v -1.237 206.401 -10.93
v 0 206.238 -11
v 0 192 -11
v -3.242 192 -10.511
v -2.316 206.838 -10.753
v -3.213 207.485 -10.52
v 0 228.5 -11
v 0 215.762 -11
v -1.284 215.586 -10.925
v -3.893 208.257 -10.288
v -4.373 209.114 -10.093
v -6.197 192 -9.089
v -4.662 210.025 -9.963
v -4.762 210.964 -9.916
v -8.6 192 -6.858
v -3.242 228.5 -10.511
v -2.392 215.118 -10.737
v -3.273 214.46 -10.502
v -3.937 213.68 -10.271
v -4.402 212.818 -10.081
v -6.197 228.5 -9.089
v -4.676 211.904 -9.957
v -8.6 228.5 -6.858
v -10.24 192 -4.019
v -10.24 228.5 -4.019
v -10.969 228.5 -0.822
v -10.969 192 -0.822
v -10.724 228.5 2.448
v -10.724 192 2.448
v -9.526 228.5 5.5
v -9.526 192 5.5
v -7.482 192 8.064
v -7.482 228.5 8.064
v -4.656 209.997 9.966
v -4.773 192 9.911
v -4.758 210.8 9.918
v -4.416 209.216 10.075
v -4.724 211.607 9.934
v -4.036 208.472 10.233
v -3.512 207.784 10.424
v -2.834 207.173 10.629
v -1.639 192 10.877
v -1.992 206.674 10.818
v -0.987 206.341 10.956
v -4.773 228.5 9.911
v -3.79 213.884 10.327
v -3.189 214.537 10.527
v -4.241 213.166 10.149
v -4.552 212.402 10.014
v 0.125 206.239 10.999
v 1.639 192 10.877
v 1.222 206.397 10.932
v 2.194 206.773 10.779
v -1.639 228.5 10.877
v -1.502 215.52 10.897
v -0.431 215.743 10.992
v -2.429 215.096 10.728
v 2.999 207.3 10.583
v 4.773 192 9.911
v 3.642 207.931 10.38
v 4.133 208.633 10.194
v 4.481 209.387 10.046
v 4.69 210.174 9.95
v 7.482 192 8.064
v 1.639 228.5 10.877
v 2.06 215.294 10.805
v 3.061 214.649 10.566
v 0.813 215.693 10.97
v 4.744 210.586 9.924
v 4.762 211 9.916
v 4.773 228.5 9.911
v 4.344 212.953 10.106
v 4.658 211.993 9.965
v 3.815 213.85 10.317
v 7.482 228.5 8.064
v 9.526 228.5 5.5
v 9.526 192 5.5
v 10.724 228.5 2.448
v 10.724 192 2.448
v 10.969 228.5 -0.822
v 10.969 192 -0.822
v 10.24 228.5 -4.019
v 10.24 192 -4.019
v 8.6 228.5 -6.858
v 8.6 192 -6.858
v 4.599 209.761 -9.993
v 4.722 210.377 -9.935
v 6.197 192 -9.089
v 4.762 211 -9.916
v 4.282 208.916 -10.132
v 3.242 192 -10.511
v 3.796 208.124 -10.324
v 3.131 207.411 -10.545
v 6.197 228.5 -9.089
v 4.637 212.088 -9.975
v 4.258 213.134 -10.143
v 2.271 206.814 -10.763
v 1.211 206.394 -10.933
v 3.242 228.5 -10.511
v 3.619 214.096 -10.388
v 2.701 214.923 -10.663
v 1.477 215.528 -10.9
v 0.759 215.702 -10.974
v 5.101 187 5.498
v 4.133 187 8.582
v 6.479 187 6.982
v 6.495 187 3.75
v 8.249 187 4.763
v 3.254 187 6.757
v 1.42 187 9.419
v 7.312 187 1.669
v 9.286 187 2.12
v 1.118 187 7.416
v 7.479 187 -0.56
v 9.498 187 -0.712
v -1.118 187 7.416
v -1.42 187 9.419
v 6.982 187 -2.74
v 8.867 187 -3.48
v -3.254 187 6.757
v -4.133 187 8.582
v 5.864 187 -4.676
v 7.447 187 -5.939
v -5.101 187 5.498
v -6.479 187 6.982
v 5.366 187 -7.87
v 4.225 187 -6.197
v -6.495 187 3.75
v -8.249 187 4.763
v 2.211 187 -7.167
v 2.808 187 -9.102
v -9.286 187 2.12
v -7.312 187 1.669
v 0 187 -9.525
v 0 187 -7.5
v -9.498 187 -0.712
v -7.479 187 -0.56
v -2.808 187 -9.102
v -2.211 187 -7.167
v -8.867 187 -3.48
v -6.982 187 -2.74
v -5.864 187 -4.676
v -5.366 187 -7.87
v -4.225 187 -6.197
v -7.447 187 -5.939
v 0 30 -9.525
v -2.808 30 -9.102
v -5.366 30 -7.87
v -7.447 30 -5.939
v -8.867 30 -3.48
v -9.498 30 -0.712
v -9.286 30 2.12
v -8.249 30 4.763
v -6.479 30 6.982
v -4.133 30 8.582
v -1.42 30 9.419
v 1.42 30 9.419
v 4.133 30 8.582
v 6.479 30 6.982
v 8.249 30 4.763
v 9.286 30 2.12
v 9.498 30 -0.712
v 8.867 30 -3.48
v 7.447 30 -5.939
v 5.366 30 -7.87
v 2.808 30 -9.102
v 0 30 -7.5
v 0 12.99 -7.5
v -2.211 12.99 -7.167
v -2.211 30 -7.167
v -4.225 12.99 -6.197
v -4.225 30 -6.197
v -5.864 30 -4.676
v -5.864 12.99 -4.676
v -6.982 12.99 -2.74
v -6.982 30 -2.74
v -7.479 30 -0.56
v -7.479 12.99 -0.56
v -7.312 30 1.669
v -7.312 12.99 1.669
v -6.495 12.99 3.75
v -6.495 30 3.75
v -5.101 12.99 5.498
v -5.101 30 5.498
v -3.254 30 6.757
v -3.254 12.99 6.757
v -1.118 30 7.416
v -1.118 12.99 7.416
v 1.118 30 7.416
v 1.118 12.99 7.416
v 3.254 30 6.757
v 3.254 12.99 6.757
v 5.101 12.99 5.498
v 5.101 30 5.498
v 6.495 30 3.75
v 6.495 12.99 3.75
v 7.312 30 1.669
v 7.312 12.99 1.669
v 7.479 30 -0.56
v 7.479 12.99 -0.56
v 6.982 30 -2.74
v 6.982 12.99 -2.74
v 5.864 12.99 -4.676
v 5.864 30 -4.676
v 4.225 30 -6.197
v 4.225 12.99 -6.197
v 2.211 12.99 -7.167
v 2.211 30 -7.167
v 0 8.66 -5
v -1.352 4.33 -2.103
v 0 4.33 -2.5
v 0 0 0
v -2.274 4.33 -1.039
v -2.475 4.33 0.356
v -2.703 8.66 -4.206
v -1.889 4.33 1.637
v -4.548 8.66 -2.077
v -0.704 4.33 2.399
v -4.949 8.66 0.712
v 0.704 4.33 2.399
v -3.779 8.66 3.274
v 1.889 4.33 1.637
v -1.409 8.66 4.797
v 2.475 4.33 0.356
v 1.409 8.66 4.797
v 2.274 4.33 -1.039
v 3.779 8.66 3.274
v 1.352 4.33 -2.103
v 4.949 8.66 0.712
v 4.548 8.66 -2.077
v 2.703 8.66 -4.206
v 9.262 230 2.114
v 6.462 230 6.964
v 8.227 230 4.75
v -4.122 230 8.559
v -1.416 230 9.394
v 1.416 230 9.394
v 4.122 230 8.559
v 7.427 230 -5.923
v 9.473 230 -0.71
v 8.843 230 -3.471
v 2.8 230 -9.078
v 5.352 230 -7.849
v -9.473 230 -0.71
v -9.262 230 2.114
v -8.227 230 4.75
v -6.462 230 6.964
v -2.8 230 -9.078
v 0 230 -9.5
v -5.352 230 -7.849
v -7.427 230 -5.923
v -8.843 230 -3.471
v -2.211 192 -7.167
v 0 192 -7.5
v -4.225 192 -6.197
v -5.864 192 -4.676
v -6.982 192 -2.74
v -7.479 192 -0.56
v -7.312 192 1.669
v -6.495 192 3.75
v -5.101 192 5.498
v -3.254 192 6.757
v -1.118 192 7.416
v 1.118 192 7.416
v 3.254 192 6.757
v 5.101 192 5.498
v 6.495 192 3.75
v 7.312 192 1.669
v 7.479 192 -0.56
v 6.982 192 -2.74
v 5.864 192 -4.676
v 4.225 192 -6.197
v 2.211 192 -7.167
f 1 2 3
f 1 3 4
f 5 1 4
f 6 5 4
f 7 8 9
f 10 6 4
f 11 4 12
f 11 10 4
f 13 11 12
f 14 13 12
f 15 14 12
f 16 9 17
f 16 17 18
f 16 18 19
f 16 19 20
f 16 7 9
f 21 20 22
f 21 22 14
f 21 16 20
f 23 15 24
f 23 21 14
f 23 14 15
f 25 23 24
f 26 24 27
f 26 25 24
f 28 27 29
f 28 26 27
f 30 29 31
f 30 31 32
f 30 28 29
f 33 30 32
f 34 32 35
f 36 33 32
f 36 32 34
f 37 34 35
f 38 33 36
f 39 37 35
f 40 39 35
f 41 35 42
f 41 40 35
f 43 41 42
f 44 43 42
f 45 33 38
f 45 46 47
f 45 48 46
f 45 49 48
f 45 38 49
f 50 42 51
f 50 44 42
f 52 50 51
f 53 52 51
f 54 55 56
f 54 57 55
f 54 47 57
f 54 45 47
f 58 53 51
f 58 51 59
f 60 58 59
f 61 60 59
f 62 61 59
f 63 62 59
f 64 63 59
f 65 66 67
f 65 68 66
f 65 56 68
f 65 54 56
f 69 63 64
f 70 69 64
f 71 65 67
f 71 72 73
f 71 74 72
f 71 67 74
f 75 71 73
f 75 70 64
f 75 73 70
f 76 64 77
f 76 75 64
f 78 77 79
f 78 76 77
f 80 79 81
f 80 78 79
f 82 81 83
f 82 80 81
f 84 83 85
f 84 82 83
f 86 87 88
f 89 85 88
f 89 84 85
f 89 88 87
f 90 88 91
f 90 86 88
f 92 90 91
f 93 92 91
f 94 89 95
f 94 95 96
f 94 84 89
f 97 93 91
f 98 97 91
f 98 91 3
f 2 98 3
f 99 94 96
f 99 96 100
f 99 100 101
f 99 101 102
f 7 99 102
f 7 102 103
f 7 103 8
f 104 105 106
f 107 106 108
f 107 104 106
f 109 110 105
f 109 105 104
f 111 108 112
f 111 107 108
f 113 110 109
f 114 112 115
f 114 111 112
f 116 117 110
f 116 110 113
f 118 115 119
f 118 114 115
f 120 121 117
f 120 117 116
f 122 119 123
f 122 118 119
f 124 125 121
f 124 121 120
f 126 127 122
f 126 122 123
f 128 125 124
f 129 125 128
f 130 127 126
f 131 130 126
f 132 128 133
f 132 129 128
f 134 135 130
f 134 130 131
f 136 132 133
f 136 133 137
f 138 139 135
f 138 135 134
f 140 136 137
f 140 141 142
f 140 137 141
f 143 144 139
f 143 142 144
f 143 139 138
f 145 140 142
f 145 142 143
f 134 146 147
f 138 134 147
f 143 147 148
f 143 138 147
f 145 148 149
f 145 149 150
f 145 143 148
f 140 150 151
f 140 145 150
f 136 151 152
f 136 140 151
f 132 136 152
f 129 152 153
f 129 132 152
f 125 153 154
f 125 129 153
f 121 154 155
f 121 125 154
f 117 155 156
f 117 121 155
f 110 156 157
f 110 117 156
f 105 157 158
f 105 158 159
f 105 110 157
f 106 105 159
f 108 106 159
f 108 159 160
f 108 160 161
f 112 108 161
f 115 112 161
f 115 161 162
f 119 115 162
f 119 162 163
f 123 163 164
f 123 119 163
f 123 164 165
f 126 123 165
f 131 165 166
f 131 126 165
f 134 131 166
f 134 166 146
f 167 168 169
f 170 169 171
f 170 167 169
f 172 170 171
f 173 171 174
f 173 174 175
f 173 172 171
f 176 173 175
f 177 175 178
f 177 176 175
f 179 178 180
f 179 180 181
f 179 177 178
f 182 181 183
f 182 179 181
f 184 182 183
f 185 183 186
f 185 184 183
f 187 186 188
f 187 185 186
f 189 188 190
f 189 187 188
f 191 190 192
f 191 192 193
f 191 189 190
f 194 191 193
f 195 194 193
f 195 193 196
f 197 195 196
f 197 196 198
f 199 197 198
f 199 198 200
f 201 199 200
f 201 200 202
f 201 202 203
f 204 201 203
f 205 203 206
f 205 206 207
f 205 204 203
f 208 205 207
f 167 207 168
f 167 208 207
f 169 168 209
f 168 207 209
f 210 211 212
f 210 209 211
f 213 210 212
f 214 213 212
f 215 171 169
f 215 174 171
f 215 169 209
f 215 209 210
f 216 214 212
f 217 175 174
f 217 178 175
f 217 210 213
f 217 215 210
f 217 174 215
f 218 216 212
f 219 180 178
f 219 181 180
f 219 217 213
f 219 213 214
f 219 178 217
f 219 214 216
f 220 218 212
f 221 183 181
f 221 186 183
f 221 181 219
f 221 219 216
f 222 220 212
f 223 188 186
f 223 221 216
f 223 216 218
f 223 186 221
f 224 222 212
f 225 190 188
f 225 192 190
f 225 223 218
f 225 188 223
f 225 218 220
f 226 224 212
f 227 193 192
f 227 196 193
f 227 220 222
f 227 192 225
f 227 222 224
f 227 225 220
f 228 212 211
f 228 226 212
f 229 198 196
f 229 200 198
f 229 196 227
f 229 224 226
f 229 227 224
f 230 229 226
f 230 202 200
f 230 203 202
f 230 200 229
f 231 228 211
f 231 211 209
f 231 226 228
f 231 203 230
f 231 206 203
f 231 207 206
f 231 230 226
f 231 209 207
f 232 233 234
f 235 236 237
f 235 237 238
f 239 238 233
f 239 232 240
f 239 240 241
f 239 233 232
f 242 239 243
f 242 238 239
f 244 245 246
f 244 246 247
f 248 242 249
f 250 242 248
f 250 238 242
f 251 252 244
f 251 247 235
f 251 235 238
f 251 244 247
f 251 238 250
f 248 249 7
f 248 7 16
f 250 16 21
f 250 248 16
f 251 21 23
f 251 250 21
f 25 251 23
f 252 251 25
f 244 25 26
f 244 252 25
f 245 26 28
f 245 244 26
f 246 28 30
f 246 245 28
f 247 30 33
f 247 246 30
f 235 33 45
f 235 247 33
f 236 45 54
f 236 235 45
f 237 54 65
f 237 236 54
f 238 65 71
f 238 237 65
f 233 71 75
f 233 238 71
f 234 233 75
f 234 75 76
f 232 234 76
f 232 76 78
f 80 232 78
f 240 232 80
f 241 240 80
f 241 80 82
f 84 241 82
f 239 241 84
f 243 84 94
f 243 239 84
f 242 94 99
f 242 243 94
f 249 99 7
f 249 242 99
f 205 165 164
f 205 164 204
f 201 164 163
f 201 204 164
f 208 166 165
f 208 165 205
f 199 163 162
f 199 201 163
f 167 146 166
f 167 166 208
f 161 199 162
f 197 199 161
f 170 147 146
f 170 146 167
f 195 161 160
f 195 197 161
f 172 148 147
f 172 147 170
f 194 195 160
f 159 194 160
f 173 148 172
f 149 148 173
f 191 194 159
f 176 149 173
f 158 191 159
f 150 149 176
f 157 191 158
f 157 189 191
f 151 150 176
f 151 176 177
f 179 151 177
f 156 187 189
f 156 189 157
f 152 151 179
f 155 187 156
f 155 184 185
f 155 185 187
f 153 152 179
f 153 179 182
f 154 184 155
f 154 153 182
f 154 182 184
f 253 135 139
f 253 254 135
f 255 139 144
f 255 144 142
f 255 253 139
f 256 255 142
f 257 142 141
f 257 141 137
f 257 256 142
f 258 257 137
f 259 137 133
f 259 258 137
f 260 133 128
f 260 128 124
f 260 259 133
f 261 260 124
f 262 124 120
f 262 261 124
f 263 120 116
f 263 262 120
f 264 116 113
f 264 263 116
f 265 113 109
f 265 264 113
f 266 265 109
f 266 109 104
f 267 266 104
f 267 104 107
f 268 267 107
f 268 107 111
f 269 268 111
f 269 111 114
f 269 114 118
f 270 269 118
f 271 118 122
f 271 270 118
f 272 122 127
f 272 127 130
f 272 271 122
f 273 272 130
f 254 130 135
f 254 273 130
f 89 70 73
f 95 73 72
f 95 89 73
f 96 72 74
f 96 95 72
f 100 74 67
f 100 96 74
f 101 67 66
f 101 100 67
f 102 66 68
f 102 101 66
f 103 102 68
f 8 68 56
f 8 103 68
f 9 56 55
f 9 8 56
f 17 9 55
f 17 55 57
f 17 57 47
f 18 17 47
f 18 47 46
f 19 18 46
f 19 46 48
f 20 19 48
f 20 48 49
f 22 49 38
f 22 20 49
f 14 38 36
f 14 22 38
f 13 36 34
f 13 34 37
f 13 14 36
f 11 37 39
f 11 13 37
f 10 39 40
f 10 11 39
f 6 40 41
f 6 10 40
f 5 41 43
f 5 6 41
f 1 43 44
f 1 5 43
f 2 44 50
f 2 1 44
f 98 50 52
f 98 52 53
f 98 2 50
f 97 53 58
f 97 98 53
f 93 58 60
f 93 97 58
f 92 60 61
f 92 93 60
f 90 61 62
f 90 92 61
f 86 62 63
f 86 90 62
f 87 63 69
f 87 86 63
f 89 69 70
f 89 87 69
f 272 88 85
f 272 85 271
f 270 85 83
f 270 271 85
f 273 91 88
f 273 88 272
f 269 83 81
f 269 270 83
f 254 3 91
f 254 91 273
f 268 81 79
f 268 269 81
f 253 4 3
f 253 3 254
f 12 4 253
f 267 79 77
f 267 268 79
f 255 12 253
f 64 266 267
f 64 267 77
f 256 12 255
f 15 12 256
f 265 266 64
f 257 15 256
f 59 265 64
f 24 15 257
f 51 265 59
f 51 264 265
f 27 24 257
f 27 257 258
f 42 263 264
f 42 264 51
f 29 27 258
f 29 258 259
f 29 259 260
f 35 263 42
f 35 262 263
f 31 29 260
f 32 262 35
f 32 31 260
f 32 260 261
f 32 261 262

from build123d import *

# Parameters (mm, degrees)
CORTAR_EXTRUIR1_DEPTH      = 231.52548666
CORTAR_EXTRUIR1_DEPTH_BACK = 231.52548666
CROQUIS2_R                 = 4.7625
CHAFL_N1_SIZE              = 1.5


with BuildPart() as part:
    # Croquis1 → Revolución1 (revolve)
    with BuildSketch(Plane.XY, mode=Mode.PRIVATE) as revoluci_n1_sk:
        Polygon((0, 0), (7.5, 12.990381057), (7.5, 30), (9.525, 30), (9.525, 187), (7.5, 187), (7.5, 192), (11, 192), (11, 230), (0, 230), align=None)
    revolve(revoluci_n1_sk.sketch.rotate(Axis((0, 0, 0), (0, 1, 0)), 90), axis=Axis((0, 0, 0), (0, 1, 0)))

    # Croquis2 → Cortar-Extruir1 (cut, two sides: drawn at the far end of the back side and taken through both)
    with BuildSketch(Plane.XY.offset(-CORTAR_EXTRUIR1_DEPTH_BACK)):
        with Locations((0, 211)):
            Circle(CROQUIS2_R)
    extrude(amount=CORTAR_EXTRUIR1_DEPTH + CORTAR_EXTRUIR1_DEPTH_BACK, mode=Mode.SUBTRACT)

    # Chaflán1
    chafl_n1_edges = [part.edges().sort_by_distance(p)[0] for p in [
        (0, 230, 11),
    ]]
    chamfer(chafl_n1_edges, length=CHAFL_N1_SIZE)


solid = part.part
